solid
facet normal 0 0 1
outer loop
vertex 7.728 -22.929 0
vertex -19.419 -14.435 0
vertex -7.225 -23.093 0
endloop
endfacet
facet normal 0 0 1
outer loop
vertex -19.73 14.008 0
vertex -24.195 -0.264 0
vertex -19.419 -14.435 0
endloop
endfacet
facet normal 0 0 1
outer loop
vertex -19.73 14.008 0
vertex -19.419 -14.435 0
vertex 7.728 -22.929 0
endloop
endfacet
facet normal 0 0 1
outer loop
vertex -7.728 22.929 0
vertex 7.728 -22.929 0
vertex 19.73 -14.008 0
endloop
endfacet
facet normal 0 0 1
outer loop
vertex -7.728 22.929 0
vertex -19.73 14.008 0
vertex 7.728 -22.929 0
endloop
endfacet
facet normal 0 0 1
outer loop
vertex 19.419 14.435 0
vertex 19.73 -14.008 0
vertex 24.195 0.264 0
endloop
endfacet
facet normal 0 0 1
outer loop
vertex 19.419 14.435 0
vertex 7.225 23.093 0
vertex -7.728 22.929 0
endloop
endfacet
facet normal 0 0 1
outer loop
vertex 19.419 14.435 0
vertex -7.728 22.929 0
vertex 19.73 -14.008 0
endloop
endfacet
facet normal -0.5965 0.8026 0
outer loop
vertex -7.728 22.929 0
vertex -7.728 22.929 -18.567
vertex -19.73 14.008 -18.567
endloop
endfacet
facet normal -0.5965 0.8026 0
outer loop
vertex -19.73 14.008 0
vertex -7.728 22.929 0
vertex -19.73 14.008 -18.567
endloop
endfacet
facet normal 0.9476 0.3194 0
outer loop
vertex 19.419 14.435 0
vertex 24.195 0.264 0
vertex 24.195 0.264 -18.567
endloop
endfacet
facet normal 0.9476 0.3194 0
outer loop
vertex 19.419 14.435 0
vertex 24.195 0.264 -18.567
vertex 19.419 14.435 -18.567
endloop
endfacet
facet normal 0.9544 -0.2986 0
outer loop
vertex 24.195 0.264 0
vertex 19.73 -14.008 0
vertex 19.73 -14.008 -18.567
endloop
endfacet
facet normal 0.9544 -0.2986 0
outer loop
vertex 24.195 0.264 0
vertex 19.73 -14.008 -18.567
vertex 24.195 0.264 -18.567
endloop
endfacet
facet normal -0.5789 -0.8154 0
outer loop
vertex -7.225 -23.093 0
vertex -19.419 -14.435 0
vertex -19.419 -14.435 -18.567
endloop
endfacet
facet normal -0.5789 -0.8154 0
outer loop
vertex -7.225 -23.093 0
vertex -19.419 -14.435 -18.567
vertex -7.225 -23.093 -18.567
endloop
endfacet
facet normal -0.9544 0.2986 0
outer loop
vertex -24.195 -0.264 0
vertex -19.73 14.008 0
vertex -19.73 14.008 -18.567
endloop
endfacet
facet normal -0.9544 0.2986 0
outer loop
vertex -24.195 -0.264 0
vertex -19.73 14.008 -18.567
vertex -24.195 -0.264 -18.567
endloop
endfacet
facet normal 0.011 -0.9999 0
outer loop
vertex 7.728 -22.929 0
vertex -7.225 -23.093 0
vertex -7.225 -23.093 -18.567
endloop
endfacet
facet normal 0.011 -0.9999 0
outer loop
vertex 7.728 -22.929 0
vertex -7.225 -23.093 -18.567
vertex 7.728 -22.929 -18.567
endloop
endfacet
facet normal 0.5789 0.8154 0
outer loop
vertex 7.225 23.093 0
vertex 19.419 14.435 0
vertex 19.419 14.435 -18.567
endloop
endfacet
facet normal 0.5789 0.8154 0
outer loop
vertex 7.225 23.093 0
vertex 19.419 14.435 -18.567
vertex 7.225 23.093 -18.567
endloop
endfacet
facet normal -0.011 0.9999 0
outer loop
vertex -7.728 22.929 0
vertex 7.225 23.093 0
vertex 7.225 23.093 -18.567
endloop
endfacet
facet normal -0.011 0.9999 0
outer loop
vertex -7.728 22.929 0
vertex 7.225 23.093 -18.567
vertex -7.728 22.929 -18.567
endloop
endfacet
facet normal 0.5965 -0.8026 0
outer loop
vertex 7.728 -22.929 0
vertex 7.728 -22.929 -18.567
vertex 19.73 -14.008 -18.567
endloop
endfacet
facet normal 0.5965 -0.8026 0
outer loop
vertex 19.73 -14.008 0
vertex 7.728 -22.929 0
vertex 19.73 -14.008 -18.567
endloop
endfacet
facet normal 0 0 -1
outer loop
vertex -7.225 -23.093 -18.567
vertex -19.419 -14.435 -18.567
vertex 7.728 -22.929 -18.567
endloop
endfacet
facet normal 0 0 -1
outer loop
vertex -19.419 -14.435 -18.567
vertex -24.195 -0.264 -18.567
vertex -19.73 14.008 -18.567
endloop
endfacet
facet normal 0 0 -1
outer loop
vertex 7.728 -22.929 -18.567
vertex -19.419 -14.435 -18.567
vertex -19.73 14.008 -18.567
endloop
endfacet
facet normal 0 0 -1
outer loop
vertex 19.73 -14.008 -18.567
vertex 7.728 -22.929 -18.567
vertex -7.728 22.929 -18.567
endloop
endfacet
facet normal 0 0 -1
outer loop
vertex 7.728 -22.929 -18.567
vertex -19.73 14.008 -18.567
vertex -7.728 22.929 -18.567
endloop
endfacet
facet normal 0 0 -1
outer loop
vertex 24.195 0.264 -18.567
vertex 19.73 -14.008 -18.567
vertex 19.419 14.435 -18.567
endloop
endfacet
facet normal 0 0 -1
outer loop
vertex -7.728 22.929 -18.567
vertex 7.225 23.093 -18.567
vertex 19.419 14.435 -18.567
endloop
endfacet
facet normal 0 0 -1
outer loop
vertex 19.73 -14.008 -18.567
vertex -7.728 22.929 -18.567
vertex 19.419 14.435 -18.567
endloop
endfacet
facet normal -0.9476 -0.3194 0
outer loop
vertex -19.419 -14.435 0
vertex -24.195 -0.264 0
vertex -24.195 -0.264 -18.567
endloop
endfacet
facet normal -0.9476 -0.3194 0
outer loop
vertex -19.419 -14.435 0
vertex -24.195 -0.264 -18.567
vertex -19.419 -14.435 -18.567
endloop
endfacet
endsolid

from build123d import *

# Parameters (mm, degrees)
F1_DEPTH = 18.5674


with BuildPart() as f1:
    # F0 (on Top) → F1 (new body)
    with BuildSketch(Plane.XY):
        Polygon((7.728108, -22.929351), (19.729705, -14.007767), (24.195226, 0.264309), (19.418992, 14.435427), (7.225363, 23.092703), (-7.728108, 22.929351), (-19.729705, 14.007767), (-24.195226, -0.264309), (-19.418992, -14.435427), (-7.225363, -23.092703), align=None)
    extrude(amount=-F1_DEPTH)


solid = f1.part
